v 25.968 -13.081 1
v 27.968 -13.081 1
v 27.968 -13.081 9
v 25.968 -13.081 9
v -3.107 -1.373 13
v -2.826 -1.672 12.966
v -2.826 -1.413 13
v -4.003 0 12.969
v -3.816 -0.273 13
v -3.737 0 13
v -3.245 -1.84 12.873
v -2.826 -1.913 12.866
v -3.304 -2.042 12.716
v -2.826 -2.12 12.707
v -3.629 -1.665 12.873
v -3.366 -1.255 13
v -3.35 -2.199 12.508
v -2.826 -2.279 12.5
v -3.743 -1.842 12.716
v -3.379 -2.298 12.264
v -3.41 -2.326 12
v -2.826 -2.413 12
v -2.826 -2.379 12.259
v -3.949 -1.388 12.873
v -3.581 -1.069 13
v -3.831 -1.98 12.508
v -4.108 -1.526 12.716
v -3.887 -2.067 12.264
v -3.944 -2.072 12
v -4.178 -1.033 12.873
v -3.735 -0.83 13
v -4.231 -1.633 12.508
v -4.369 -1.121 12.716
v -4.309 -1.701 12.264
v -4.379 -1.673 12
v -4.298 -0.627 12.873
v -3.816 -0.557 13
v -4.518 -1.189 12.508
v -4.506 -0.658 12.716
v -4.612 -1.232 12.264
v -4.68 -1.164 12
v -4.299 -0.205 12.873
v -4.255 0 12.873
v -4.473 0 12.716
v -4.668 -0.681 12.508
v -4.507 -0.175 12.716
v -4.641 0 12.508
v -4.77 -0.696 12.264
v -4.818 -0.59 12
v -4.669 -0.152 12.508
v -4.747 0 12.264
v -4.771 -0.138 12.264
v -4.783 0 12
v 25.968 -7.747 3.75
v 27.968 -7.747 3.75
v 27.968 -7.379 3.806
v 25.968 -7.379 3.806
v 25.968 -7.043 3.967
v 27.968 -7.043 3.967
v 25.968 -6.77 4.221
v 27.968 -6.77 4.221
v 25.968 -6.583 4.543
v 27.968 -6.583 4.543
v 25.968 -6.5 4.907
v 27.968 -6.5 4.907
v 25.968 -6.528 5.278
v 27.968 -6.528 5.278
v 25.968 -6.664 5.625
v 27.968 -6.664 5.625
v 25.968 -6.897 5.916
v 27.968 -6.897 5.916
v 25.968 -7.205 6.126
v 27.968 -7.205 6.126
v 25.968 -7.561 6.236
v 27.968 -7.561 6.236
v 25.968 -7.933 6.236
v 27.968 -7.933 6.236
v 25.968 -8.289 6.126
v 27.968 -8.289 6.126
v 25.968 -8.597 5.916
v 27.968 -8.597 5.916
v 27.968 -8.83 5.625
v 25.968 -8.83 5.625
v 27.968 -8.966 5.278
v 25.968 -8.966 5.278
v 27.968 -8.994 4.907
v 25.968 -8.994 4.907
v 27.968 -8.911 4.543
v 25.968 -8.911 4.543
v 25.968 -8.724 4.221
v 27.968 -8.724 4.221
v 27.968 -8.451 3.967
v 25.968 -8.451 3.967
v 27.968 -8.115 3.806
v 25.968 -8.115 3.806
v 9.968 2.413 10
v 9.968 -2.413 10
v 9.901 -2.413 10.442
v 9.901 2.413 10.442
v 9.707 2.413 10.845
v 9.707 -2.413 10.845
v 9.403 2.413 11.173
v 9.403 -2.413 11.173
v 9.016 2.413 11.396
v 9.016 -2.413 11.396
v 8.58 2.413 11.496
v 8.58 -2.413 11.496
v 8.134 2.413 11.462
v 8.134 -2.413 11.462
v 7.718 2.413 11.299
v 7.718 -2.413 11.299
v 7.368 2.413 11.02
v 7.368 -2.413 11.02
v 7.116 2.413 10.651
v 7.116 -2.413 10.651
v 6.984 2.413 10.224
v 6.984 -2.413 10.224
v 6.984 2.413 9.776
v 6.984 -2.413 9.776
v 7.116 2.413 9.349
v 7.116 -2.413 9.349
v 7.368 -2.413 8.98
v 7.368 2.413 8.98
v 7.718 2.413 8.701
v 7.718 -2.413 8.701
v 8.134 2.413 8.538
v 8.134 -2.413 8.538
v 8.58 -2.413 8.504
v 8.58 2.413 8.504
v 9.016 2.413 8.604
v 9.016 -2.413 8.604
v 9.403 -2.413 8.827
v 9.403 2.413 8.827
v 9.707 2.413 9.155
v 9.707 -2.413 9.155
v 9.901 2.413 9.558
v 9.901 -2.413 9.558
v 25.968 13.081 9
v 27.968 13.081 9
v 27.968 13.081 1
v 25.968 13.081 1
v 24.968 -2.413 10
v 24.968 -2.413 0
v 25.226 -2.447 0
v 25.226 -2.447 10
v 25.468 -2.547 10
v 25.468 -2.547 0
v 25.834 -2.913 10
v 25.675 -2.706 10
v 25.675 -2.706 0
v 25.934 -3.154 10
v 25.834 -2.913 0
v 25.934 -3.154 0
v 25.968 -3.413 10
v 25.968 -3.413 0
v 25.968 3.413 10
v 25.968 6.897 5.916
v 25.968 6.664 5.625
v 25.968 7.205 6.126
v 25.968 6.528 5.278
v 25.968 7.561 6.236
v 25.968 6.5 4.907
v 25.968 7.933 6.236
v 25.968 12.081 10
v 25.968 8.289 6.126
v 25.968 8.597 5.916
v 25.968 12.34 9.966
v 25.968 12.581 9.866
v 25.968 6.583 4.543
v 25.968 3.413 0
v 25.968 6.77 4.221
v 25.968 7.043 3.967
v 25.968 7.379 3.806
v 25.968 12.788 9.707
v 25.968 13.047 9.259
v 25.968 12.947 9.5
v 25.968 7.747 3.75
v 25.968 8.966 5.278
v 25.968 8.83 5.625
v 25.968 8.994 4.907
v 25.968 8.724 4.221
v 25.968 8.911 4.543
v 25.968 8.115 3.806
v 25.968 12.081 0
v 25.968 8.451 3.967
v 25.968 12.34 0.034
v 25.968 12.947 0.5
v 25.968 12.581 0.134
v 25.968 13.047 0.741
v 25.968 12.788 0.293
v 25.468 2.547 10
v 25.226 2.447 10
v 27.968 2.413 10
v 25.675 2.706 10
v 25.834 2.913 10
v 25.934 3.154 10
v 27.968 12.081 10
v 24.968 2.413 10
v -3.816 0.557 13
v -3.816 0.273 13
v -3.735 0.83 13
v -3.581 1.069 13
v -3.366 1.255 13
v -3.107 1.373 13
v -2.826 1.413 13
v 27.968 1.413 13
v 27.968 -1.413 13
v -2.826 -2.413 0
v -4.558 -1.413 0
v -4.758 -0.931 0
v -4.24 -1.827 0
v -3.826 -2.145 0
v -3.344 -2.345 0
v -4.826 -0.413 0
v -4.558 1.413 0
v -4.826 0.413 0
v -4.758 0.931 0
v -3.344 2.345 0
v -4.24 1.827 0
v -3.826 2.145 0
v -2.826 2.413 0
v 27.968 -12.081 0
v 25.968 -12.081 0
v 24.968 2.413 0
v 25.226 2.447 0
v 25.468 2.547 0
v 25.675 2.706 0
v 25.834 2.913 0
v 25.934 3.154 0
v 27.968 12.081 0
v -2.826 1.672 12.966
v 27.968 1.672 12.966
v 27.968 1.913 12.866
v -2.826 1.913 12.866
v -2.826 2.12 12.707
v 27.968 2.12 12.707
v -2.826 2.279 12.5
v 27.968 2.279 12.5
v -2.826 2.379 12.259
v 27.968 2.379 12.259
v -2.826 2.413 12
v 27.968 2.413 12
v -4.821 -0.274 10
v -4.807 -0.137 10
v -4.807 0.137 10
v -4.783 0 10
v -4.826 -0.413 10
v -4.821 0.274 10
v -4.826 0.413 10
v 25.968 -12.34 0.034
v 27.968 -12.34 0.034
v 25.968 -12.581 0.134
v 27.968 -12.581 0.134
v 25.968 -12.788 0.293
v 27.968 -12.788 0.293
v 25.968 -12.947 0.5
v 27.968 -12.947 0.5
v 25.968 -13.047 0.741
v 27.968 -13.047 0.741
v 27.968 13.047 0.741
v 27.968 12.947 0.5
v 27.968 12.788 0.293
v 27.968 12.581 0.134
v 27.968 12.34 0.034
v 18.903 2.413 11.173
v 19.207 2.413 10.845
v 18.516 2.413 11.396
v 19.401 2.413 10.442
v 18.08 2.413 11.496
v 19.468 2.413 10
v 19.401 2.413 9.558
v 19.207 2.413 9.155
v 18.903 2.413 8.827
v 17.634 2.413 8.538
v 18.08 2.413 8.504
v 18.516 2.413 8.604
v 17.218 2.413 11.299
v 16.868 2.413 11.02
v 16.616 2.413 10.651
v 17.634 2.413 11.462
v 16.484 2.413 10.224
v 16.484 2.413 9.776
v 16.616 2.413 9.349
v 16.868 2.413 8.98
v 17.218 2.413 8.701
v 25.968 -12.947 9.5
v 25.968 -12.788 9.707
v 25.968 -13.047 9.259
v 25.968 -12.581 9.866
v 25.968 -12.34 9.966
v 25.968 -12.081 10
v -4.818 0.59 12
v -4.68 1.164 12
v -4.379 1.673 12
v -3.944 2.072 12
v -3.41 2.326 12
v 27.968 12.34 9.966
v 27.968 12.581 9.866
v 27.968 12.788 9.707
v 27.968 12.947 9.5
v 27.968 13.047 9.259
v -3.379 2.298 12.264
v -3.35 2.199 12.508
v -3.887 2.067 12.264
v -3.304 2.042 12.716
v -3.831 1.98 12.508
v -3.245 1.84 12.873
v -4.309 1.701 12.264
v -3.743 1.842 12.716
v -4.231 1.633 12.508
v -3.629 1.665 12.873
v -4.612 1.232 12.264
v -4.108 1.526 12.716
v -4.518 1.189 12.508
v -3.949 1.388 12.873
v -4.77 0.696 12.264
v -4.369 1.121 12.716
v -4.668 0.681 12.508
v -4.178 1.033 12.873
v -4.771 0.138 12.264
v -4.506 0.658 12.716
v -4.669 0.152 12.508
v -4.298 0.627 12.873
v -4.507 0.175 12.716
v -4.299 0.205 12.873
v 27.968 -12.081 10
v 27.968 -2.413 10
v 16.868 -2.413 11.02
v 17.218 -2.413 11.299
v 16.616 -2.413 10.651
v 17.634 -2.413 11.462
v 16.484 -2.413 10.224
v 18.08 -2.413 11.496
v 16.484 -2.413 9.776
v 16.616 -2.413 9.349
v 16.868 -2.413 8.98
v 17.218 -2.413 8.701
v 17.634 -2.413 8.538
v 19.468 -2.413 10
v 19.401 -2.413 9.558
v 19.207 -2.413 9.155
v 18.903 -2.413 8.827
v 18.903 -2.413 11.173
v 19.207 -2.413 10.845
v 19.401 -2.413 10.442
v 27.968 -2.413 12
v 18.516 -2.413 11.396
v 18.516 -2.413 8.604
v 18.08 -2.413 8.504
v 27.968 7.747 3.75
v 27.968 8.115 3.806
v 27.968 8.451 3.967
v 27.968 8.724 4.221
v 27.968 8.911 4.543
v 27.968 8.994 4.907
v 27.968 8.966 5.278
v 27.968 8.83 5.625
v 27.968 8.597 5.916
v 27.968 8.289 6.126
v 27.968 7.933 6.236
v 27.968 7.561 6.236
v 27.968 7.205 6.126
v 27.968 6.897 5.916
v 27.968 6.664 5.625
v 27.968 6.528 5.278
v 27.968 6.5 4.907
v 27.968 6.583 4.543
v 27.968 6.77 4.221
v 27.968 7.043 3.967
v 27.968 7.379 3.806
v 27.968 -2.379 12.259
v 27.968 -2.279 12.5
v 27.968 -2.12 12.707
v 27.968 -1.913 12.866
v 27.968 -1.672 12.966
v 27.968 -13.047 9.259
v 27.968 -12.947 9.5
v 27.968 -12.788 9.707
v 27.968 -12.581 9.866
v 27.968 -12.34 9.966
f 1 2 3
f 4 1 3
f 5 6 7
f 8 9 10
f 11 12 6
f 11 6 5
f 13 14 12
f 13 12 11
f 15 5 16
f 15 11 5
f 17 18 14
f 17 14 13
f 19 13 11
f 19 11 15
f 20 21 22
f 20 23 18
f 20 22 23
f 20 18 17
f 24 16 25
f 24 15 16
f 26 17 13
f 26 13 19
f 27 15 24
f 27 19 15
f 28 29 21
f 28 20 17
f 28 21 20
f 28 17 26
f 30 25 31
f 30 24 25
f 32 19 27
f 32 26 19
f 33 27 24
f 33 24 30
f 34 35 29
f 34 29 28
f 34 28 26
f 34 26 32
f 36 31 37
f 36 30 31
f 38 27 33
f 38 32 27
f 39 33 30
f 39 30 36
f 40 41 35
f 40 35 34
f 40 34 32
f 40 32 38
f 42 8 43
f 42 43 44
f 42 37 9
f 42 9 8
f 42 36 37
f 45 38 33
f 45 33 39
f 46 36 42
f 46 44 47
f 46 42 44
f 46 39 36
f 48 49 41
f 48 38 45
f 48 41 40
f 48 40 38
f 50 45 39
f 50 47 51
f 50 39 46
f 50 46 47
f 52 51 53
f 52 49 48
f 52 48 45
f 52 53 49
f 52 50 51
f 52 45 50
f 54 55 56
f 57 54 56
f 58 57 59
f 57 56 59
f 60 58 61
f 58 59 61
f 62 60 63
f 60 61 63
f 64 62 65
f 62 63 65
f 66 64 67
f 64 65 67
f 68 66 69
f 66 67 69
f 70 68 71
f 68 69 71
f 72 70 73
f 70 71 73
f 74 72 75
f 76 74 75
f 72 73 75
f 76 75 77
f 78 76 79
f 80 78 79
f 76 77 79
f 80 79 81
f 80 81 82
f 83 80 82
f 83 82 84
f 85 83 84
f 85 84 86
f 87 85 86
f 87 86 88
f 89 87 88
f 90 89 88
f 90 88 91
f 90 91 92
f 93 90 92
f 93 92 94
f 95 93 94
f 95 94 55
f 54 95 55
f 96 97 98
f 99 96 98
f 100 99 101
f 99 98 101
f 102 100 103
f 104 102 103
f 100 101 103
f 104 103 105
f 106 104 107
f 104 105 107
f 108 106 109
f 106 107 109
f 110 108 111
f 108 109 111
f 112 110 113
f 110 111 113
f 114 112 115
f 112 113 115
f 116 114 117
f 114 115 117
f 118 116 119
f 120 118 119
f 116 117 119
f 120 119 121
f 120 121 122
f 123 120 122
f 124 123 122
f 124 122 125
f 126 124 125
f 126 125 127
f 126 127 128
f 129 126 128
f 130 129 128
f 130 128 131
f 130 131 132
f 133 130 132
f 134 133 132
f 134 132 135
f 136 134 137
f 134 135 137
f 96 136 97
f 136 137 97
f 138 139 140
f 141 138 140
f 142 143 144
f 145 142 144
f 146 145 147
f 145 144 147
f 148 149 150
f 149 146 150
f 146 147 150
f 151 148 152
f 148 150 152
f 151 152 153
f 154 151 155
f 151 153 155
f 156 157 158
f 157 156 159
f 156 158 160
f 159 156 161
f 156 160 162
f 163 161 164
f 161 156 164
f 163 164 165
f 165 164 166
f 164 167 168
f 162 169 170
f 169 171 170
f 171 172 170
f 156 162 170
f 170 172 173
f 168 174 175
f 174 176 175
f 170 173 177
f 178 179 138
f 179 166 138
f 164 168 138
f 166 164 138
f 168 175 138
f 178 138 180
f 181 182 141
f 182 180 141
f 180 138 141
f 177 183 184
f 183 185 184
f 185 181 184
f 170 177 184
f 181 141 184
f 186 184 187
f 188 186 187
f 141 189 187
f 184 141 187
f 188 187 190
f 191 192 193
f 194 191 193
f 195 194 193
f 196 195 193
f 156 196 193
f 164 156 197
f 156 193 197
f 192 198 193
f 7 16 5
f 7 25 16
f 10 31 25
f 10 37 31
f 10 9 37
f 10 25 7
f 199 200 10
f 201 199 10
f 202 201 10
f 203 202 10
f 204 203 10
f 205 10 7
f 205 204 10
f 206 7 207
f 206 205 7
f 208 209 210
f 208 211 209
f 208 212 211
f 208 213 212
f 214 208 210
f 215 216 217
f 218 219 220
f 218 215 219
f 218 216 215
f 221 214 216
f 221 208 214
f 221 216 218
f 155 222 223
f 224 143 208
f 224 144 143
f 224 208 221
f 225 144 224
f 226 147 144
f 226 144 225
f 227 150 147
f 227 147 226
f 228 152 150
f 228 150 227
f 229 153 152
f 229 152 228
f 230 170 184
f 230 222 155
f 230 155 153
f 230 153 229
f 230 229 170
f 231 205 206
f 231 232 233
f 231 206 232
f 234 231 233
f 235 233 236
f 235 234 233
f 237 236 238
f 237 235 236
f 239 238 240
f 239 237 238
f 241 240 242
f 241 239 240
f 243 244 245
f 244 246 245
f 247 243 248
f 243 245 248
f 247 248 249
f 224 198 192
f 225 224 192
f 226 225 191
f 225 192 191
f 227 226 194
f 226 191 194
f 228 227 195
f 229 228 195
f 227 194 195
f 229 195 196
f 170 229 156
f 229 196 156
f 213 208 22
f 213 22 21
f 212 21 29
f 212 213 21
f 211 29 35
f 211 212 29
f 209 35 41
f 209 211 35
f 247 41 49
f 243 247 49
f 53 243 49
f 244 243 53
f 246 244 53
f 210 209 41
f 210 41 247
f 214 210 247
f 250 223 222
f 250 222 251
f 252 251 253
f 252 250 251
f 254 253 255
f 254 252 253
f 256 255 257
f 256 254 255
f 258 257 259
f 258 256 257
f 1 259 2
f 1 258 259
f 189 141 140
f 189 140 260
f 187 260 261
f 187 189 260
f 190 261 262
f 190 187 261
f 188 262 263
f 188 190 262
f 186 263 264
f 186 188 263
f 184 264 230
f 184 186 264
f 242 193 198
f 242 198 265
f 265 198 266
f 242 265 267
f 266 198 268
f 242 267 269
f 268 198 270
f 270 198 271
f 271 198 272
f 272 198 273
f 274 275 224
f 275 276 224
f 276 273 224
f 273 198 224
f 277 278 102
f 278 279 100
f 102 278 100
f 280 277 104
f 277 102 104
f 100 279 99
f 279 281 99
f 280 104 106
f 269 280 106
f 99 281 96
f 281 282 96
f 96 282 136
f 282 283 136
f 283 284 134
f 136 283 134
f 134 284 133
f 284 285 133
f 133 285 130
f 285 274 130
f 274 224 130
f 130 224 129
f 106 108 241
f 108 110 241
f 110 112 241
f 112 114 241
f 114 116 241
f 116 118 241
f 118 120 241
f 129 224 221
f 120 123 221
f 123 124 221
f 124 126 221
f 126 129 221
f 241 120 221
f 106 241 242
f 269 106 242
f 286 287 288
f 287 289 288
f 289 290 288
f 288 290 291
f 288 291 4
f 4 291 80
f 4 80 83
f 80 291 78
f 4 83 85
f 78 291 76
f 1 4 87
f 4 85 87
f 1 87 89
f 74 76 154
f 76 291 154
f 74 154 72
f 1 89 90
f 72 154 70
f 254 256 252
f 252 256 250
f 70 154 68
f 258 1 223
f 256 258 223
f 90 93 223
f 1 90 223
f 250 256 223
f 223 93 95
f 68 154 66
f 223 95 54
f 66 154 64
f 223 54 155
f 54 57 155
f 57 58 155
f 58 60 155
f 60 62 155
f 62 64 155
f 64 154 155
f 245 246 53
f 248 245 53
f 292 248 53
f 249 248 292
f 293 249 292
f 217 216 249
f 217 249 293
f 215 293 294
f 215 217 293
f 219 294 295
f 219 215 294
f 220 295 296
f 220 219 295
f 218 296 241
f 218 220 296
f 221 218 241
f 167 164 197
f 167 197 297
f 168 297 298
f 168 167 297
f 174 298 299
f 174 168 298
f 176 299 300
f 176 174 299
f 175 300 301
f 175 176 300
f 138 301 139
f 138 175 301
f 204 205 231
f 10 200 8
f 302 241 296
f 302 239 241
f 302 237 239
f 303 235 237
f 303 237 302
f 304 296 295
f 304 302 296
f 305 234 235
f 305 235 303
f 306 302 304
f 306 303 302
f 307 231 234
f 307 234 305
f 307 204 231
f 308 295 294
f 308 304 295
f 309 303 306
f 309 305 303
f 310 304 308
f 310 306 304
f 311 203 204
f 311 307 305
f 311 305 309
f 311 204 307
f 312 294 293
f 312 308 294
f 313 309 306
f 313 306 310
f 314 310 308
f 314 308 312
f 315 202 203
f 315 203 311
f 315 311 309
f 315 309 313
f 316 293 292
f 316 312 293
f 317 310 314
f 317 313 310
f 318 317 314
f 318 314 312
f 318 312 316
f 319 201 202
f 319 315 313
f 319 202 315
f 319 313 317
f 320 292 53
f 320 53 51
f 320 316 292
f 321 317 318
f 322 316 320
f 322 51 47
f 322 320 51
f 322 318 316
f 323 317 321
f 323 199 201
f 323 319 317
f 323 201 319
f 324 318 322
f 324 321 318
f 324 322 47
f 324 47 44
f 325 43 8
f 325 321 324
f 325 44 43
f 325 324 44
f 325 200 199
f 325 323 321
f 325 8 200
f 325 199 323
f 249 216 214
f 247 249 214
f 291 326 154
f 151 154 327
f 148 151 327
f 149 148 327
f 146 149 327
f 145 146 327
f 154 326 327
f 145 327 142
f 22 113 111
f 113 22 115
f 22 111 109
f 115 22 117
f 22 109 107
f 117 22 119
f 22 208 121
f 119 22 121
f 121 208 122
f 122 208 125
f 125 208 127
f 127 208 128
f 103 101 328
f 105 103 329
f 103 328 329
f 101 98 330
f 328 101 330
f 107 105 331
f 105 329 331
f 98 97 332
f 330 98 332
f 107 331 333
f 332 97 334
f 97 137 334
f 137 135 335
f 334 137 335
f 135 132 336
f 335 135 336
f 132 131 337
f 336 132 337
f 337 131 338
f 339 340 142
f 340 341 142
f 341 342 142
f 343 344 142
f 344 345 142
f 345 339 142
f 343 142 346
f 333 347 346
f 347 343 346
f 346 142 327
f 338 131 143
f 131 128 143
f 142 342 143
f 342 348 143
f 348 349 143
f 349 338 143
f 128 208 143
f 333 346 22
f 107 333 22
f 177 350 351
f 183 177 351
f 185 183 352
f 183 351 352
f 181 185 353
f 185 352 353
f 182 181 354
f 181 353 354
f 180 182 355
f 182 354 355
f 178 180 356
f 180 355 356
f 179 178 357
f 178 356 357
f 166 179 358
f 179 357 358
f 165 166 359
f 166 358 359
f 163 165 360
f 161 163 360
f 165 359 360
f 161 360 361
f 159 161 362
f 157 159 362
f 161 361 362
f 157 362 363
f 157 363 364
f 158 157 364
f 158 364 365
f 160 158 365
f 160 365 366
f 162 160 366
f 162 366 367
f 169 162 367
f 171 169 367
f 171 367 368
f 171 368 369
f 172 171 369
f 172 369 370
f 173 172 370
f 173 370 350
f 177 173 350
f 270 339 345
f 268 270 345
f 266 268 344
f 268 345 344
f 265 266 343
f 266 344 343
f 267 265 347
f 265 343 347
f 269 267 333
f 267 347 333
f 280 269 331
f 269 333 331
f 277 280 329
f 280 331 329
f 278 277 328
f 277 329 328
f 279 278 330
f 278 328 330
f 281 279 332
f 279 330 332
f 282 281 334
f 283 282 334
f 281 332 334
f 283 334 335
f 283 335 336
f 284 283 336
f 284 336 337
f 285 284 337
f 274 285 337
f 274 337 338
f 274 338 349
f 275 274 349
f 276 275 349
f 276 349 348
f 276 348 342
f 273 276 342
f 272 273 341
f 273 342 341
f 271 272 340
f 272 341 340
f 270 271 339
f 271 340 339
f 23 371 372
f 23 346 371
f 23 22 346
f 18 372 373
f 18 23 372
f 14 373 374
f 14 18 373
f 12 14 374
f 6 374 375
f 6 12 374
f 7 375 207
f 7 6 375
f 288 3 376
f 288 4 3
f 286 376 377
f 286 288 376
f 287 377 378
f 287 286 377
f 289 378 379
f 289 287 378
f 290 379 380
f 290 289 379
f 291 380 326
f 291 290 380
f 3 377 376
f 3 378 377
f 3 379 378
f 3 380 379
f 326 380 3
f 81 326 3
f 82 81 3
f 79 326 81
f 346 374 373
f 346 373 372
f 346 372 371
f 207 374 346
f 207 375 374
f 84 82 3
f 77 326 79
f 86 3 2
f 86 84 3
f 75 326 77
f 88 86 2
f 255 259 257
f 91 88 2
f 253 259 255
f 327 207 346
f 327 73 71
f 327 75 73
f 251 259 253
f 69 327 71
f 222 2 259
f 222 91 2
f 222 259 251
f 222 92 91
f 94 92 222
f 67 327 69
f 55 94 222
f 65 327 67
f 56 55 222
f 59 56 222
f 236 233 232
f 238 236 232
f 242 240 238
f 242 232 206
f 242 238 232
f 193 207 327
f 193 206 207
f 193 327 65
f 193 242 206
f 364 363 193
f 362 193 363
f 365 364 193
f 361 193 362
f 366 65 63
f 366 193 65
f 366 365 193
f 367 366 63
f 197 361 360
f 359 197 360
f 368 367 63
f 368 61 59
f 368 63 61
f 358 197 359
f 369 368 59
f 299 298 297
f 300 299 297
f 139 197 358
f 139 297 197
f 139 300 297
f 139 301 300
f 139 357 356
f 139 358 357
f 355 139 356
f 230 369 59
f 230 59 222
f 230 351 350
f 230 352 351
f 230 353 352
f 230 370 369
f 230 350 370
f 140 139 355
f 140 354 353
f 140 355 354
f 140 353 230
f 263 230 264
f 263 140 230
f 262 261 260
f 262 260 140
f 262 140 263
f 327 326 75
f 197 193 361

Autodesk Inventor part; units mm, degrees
ref_plane "YZ Plane" through (0, 0, 0) normal (1, 0, 0) x (0, 1, 0)
ref_plane "XZ Plane" through (0, 0, 0) normal (0, 1, 0) x (-1, 0, 0)
sketch "Sketch1" plane through (0, 0, 0) normal (0, 0, 1) x (1, 0, 0)
  line L0 (-4.826, 0.413) -> (-4.826, -0.413) projected
  line L1 (-2.826, -2.413) -> (4.826, -2.413) projected
  line L2 (4.826, -2.413) -> (4.826, 2.413) projected
  line L3 (4.826, 2.413) -> (-2.826, 2.413) projected
  arc A0 (-4.826, -0.413) -> (-2.826, -2.413) centre (-2.826, -0.413) ccw projected
  arc A1 (-2.826, 2.413) -> (-4.826, 0.413) centre (-2.826, 0.413) ccw projected
  point P0 (0, 0)
extrude "Extrusion1" add sketch "Sketch1" along normal blind 10
sketch "Sketch2" plane through (4.826, -2.413, 0) normal (1, 0, 0) x (0, 0, -1)
  line L0 (0, 0) -> (-10, 0) projected
  line L1 (-10, 0) -> (-10, 4.826) projected
  circle A0 centre (3.175, 150.3292) radius 1.5 projected
  circle A1 centre (3.175, 23.749) radius 1.5 projected
  circle A2 centre (73.025, 23.749) radius 1.5 projected
  circle A3 centre (73.025, 150.3292) radius 1.5 projected
  arc A4 (60.2046, 236.2874) -> (0.9041, 211.5001) centre (77.9391, 110.5317) ccw projected
  ellipse E0 centre (170.686, 87.0391) end of major axis (408.43, 87.0391) minor radius 177.8 (0.9041, 211.5001) -> (0.9041, -37.4219) ccw projected
  arc A5 (0.9041, -37.4219) -> (60.2046, -62.2092) centre (77.9391, 63.5465) ccw projected
  arc A6 (60.2046, -62.2092) -> (281.1673, -62.2092) centre (170.686, 721.2179) ccw projected
  arc A7 (281.1673, -62.2092) -> (340.4678, -37.4219) centre (263.4329, 63.5465) ccw projected
  ellipse E1 centre (170.686, 87.0391) end of major axis (408.43, 87.0391) minor radius 177.8 (340.4678, -37.4219) -> (340.4678, 211.5001) ccw projected
  arc A8 (340.4678, 211.5001) -> (281.1673, 236.2874) centre (263.4329, 110.5317) ccw projected
  arc A9 (281.1673, 236.2874) -> (60.2046, 236.2874) centre (170.686, -547.1397) ccw projected
  circle A10 centre (18.1159, 118.5546) radius 1.25 projected
  circle A11 centre (-51.7341, 53.7756) radius 1.25 projected
  circle A12 centre (18.1159, 53.7756) radius 1.25 projected
  circle A13 centre (-51.7341, 118.5546) radius 1.25 projected
  circle A14 centre (395.605, 77.7641) radius 1.25 projected
  circle A15 centre (321.1037, 62.7821) radius 1.25 projected
  circle A16 centre (321.1037, 101.1361) radius 1.25 projected
  circle A17 centre (395.605, 96.3141) radius 1.25 projected
  line L2 (284.5488, 72.0792) -> (223.628, 72.0792) projected
  line L3 (223.628, 72.0792) -> (223.628, 102.5592) projected
  line L4 (223.628, 102.5592) -> (284.5488, 102.5592) projected
  line L5 (284.5488, 102.5592) -> (284.5488, 72.0792) projected
  circle A18 centre (129.4087, 87.0391) radius 30.4 projected
  line L6 (95.6616, 45.3432) -> (95.6616, 49.3432) projected
  arc A19 (98.6614, 49.3432) -> (95.6616, 49.3432) centre (97.1615, 49.3432) ccw projected
  line L7 (98.6614, 49.3432) -> (98.6614, 45.3432) projected
  arc A20 (95.6616, 45.3432) -> (98.6614, 45.3432) centre (97.1615, 45.3432) ccw projected
  line L8 (160.3503, 45.3892) -> (160.3503, 49.3892) projected
  arc A21 (163.3501, 49.3892) -> (160.3503, 49.3892) centre (161.8502, 49.3892) ccw projected
  line L9 (163.3501, 49.3892) -> (163.3501, 45.3892) projected
  arc A22 (160.3503, 45.3892) -> (163.3501, 45.3892) centre (161.8502, 45.3892) ccw projected
  line L10 (95.5803, 159.8921) -> (95.5803, 163.8921) projected
  arc A23 (98.5801, 163.8921) -> (95.5803, 163.8921) centre (97.0802, 163.8921) ccw projected
  line L11 (98.5801, 163.8921) -> (98.5801, 159.8921) projected
  arc A24 (95.5803, 159.8921) -> (98.5801, 159.8921) centre (97.0802, 159.8921) ccw projected
  line L12 (163.3504, 163.8921) -> (163.3504, 159.8921) projected
  arc A25 (160.3506, 159.8921) -> (163.3504, 159.8921) centre (161.8505, 159.8921) ccw projected
  line L13 (160.3506, 159.8921) -> (160.3506, 163.8921) projected
  arc A26 (163.3504, 163.8921) -> (160.3506, 163.8921) centre (161.8505, 163.8921) ccw projected
  arc A27 (180.3755, 134.9774) -> (180.3753, 131.9798) centre (180.3755, 133.4786) ccw projected
  line L14 (180.3755, 134.9774) -> (184.3754, 134.9776) projected
  arc A28 (184.3754, 131.9796) -> (184.3754, 134.9776) centre (184.3755, 133.4786) ccw projected
  line L15 (184.3754, 131.9796) -> (180.3753, 131.9798) projected
  arc A29 (65.9852, 134.9725) -> (65.9851, 131.9749) centre (65.9852, 133.4737) ccw projected
  line L16 (65.9852, 134.9725) -> (69.9852, 134.9727) projected
  arc A30 (69.9852, 131.9747) -> (69.9852, 134.9727) centre (69.9852, 133.4737) ccw projected
  line L17 (69.9852, 131.9747) -> (65.9851, 131.9749) projected
  arc A31 (188.0254, 134.9778) -> (188.0255, 131.9802) centre (188.0255, 133.479) ccw projected
  line L18 (188.0254, 134.9778) -> (192.0254, 134.978) projected
  arc A32 (192.0254, 131.98) -> (192.0254, 134.978) centre (192.0255, 133.479) ccw projected
  line L19 (192.0254, 131.98) -> (188.0255, 131.9802) projected
  arc A33 (73.6382, 70.1265) -> (73.6381, 67.1289) centre (73.6382, 68.6277) ccw projected
  line L20 (73.6382, 70.1265) -> (77.6381, 70.1267) projected
  arc A34 (77.6381, 67.1287) -> (77.6381, 70.1267) centre (77.6382, 68.6277) ccw projected
  line L21 (77.6381, 67.1287) -> (73.6381, 67.1289) projected
  circle A35 centre (271.4412, 59.8872) radius 1.25 projected
  circle A36 centre (229.978, 118.4342) radius 1.25 projected
  circle A37 centre (281.3738, 108.9092) radius 1.25 projected
  circle A38 centre (278.1988, 118.4342) radius 1.25 projected
  circle A39 centre (254.0826, 118.4342) radius 1.25 projected
  circle A40 centre (226.803, 108.9092) radius 1.25 projected
  circle A41 centre (226.5872, 59.8872) radius 1.25 projected
  arc A42 (188.0714, 70.2078) -> (188.0714, 67.2102) centre (188.0714, 68.709) ccw projected
  line L22 (188.0714, 70.2078) -> (192.0714, 70.208) projected
  arc A43 (192.0714, 67.21) -> (192.0714, 70.208) centre (192.0714, 68.709) ccw projected
  line L23 (192.0714, 67.21) -> (188.0714, 67.2102) projected
  line L24 (73.6352, 134.9725) -> (77.6351, 134.9727) projected
  arc A44 (77.6351, 131.9747) -> (77.6351, 134.9727) centre (77.6352, 133.4737) ccw projected
  line L25 (77.6351, 131.9747) -> (73.6351, 131.9749) projected
  arc A45 (73.6352, 134.9725) -> (73.6351, 131.9749) centre (73.6352, 133.4737) ccw projected
  arc A46 (66.0312, 70.1211) -> (66.0311, 67.1235) centre (66.0312, 68.6223) ccw projected
  line L26 (66.0312, 70.1211) -> (70.0312, 70.1213) projected
  arc A47 (70.0312, 67.1233) -> (70.0312, 70.1213) centre (70.0312, 68.6223) ccw projected
  line L27 (70.0312, 67.1233) -> (66.0311, 67.1235) projected
  arc A48 (180.4215, 70.2024) -> (180.4213, 67.2048) centre (180.4215, 68.7036) ccw projected
  line L28 (180.4215, 70.2024) -> (184.4214, 70.2025) projected
  arc A49 (184.4214, 67.2046) -> (184.4214, 70.2025) centre (184.4215, 68.7036) ccw projected
  line L29 (184.4214, 67.2046) -> (180.4213, 67.2048) projected
  line L30 (160.3503, 152.2421) -> (160.3503, 156.2421) projected
  arc A50 (163.3501, 156.2421) -> (160.3503, 156.2421) centre (161.8502, 156.2421) ccw projected
  line L31 (163.3501, 156.2421) -> (163.3501, 152.2421) projected
  arc A51 (160.3503, 152.2421) -> (163.3501, 152.2421) centre (161.8502, 152.2421) ccw projected
  line L32 (95.5857, 152.1961) -> (95.5857, 156.1961) projected
  arc A52 (98.5855, 156.1961) -> (95.5857, 156.1961) centre (97.0856, 156.1961) ccw projected
  line L33 (98.5855, 156.1961) -> (98.5855, 152.1961) projected
  arc A53 (95.5857, 152.1961) -> (98.5855, 152.1961) centre (97.0856, 152.1961) ccw projected
  line L34 (160.3503, 37.7392) -> (160.3503, 41.7392) projected
  arc A54 (163.3501, 41.7392) -> (160.3503, 41.7392) centre (161.8502, 41.7392) ccw projected
  line L35 (163.3501, 41.7392) -> (163.3501, 37.7392) projected
  arc A55 (160.3503, 37.7392) -> (163.3501, 37.7392) centre (161.8502, 37.7392) ccw projected
  line L36 (95.667, 37.6932) -> (95.667, 41.6932) projected
  arc A56 (98.6669, 41.6932) -> (95.667, 41.6932) centre (97.167, 41.6932) ccw projected
  line L37 (98.6669, 41.6932) -> (98.6669, 37.6932) projected
  arc A57 (95.667, 37.6932) -> (98.6669, 37.6932) centre (97.167, 37.6932) ccw projected
  line L38 (0, 4.826) -> (-10, 4.826) projected
  line L39 (0, -10.668) -> (0, 15.494) projected
  circle A58 centre (-5, -5.334) radius 1.5 projected
  circle A59 centre (81.2, -5.334) radius 1.5 projected
  circle A60 centre (81.2, 10.16) radius 1.5 projected
  circle A61 centre (-5, 10.16) radius 1.5 projected
  circle A62 centre (-5, 163.9182) radius 1.5 projected
  circle A63 centre (81.2, 163.9182) radius 1.5 projected
  circle A64 centre (81.2, 179.4122) radius 1.5 projected
  circle A65 centre (-5, 179.4122) radius 1.5 projected
  circle A66 centre (73.025, 187.9212) radius 1.5 projected
  circle A67 centre (73.025, -13.843) radius 1.5 projected
  circle A68 centre (3.175, -13.843) radius 1.5 projected
  circle A69 centre (3.175, 187.9212) radius 1.5 projected
  circle A70 centre (268.3469, 187.9212) radius 1.5 projected
  circle A71 centre (260.1719, 179.4122) radius 1.5 projected
  circle A72 centre (346.3719, 10.16) radius 1.5 projected
  circle A73 centre (346.3719, -5.334) radius 1.5 projected
  circle A74 centre (346.3719, 179.4122) radius 1.5 projected
  circle A75 centre (338.1969, 150.3292) radius 1.5 projected
  circle A76 centre (260.1719, -5.334) radius 1.5 projected
  circle A77 centre (268.3469, 23.749) radius 1.5 projected
  circle A78 centre (268.3469, -13.843) radius 1.5 projected
  circle A79 centre (260.1719, 10.16) radius 1.5 projected
  circle A80 centre (268.3469, 150.3292) radius 1.5 projected
  circle A81 centre (338.1969, -13.843) radius 1.5 projected
  circle A82 centre (338.1969, 23.749) radius 1.5 projected
  circle A83 centre (260.1719, 163.9182) radius 1.5 projected
  circle A84 centre (338.1969, 187.9212) radius 1.5 projected
  circle A85 centre (346.3719, 163.9182) radius 1.25 projected
  point P0 (0, 2.413)
ref_plane "Work Plane1" through (27.9676, -72.374, -408.43) normal (-1, 0, 0) x (0, 0, 1)
extrude "Extrusion2" add sketch "Sketch2" along normal up to surface (23.1416 mm away) contours L0 L1 L38 L39
sketch "Sketch3" plane through (27.9676, -2.413, 10) normal (1, 0, 0) x (0, 0, -1)
  line L0 (10, -10.668) -> (10, 15.494) projected
  line L1 (10, -10.668) -> (0, -10.668)
  line L2 (0, -10.668) -> (0, 15.494)
  line L3 (0, 15.494) -> (10, 15.494)
  line L4 (10, 15.494) -> (10, -10.668)
  line L5 (10, 2.826) -> (10, 2) projected
  line L6 (10, 0) -> (10, -10.668)
  line L7 (10, 4.826) -> (10, 15.494)
  circle A0 centre (5, -5.334) radius 1.25
  circle A1 centre (5, 10.16) radius 1.25
  point P0 (10, 2.413)
  point P1 (5, -10.668)
  point P2 (5, 15.494)
  point P3 (10, -5.334)
  point P4 (10, 10.16)
  dimension "d4" = 2.5
  dimension "d5" = 2.5
extrude "Extrusion3" add sketch "Sketch3" against normal blind 2
fillet "Fillet1" radius 1 6 edges at (25.9676, -2.413, 5) (25.9676, 2.413, 5) (26.9676, 13.081, 0) (26.9676, 13.081, 10) (26.9676, -13.081, 10) (26.9676, -13.081, 0)
sketch "Sketch4" plane through (0, 0, 10) normal (0, 0, 1) x (1, 0, 0)
  point P0 (0, 0)
sketch "Sketch5" plane through (0, 0, 10) normal (0, 0, 1) x (1, 0, 0)
  line L0 (27.9676, -12.081) -> (25.9676, -12.081) projected
  line L1 (27.9676, 12.081) -> (27.9676, -12.081) projected
  line L2 (25.9676, 12.081) -> (27.9676, 12.081) projected
  line L3 (25.9676, 3.413) -> (25.9676, 12.081) projected
  arc A0 (24.9676, 2.413) -> (25.9676, 3.413) centre (24.9676, 3.413) ccw projected
  line L4 (-2.826, 2.413) -> (24.9676, 2.413) projected
  arc A1 (-2.826, 2.413) -> (-4.826, 0.413) centre (-2.826, 0.413) ccw projected
  line L5 (-4.826, 0.413) -> (-4.826, -0.413) projected
  arc A2 (-4.826, -0.413) -> (-2.826, -2.413) centre (-2.826, -0.413) ccw projected
  line L6 (-2.826, -2.413) -> (24.9676, -2.413) projected
  arc A3 (25.9676, -3.413) -> (24.9676, -2.413) centre (24.9676, -3.413) ccw projected
  line L7 (25.9676, -12.081) -> (25.9676, -3.413) projected
  line L8 (-2.826, 2.413) -> (24.9676, 2.413) projected
  line L9 (-2.826, 2.413) -> (27.9676, 2.413)
  line L10 (27.9676, 2.413) -> (27.9676, -2.413)
  line L11 (27.9676, -2.413) -> (-2.826, -2.413)
  line L12 (-2.826, -2.413) -> (-2.826, 2.413)
  circle A4 centre (-2.826, 0.413) radius 2
  circle A5 centre (-2.826, -0.413) radius 2
  line L13 (-4.826, 0.413) -> (-4.826, -0.413) projected
  line L14 (-4.826, -0.413) -> (-4.826, 0.413)
  arc A6 (-2.826, 2.413) -> (-4.826, 0.413) centre (-2.826, 0.413) ccw projected
  point P0 (0, 0)
extrude "Extrusion4" add sketch "Sketch5" along normal blind 3 contours L11 L6 A5 A4 L4 L9 L1 | A2 A5 A4 L12 | L12 A4 A5 | L12 A5 A4 A1 | A4 A5 L12 | A4 A5 L12 | L12 A5 A4
sketch "Sketch6" plane through (-2.826, -2.413, 0) normal (0, -1, 0) x (1, 0, 0)
  line L0 (30.7936, 13) -> (0, 13) projected
  line L1 (30.7936, 10) -> (30.7936, 13) projected
  line L2 (30.7936, 13) -> (30.7936, 10)
  line L3 (30.7936, 10) -> (20.7936, 10)
  circle A0 centre (20.7936, 10) radius 1.5
  line L4 (20.7936, 10) -> (11.2936, 10)
  circle A1 centre (11.2936, 10) radius 1.5
  point P0 (2.826, 0)
  dimension "d11" = 10
  dimension "d12" = 3
  dimension "d13" = 9.5
  dimension "d14" = 3
extrude "Extrusion5" cut sketch "Sketch6" against normal blind 100
fillet "Fillet2" radius 1 4 edges at (12.5708, -2.413, 13) (-4.3794, -1.6728, 13) (12.5708, 2.413, 13) (-4.3794, 1.6728, 13)
properties part number "GuideArmConnector"
